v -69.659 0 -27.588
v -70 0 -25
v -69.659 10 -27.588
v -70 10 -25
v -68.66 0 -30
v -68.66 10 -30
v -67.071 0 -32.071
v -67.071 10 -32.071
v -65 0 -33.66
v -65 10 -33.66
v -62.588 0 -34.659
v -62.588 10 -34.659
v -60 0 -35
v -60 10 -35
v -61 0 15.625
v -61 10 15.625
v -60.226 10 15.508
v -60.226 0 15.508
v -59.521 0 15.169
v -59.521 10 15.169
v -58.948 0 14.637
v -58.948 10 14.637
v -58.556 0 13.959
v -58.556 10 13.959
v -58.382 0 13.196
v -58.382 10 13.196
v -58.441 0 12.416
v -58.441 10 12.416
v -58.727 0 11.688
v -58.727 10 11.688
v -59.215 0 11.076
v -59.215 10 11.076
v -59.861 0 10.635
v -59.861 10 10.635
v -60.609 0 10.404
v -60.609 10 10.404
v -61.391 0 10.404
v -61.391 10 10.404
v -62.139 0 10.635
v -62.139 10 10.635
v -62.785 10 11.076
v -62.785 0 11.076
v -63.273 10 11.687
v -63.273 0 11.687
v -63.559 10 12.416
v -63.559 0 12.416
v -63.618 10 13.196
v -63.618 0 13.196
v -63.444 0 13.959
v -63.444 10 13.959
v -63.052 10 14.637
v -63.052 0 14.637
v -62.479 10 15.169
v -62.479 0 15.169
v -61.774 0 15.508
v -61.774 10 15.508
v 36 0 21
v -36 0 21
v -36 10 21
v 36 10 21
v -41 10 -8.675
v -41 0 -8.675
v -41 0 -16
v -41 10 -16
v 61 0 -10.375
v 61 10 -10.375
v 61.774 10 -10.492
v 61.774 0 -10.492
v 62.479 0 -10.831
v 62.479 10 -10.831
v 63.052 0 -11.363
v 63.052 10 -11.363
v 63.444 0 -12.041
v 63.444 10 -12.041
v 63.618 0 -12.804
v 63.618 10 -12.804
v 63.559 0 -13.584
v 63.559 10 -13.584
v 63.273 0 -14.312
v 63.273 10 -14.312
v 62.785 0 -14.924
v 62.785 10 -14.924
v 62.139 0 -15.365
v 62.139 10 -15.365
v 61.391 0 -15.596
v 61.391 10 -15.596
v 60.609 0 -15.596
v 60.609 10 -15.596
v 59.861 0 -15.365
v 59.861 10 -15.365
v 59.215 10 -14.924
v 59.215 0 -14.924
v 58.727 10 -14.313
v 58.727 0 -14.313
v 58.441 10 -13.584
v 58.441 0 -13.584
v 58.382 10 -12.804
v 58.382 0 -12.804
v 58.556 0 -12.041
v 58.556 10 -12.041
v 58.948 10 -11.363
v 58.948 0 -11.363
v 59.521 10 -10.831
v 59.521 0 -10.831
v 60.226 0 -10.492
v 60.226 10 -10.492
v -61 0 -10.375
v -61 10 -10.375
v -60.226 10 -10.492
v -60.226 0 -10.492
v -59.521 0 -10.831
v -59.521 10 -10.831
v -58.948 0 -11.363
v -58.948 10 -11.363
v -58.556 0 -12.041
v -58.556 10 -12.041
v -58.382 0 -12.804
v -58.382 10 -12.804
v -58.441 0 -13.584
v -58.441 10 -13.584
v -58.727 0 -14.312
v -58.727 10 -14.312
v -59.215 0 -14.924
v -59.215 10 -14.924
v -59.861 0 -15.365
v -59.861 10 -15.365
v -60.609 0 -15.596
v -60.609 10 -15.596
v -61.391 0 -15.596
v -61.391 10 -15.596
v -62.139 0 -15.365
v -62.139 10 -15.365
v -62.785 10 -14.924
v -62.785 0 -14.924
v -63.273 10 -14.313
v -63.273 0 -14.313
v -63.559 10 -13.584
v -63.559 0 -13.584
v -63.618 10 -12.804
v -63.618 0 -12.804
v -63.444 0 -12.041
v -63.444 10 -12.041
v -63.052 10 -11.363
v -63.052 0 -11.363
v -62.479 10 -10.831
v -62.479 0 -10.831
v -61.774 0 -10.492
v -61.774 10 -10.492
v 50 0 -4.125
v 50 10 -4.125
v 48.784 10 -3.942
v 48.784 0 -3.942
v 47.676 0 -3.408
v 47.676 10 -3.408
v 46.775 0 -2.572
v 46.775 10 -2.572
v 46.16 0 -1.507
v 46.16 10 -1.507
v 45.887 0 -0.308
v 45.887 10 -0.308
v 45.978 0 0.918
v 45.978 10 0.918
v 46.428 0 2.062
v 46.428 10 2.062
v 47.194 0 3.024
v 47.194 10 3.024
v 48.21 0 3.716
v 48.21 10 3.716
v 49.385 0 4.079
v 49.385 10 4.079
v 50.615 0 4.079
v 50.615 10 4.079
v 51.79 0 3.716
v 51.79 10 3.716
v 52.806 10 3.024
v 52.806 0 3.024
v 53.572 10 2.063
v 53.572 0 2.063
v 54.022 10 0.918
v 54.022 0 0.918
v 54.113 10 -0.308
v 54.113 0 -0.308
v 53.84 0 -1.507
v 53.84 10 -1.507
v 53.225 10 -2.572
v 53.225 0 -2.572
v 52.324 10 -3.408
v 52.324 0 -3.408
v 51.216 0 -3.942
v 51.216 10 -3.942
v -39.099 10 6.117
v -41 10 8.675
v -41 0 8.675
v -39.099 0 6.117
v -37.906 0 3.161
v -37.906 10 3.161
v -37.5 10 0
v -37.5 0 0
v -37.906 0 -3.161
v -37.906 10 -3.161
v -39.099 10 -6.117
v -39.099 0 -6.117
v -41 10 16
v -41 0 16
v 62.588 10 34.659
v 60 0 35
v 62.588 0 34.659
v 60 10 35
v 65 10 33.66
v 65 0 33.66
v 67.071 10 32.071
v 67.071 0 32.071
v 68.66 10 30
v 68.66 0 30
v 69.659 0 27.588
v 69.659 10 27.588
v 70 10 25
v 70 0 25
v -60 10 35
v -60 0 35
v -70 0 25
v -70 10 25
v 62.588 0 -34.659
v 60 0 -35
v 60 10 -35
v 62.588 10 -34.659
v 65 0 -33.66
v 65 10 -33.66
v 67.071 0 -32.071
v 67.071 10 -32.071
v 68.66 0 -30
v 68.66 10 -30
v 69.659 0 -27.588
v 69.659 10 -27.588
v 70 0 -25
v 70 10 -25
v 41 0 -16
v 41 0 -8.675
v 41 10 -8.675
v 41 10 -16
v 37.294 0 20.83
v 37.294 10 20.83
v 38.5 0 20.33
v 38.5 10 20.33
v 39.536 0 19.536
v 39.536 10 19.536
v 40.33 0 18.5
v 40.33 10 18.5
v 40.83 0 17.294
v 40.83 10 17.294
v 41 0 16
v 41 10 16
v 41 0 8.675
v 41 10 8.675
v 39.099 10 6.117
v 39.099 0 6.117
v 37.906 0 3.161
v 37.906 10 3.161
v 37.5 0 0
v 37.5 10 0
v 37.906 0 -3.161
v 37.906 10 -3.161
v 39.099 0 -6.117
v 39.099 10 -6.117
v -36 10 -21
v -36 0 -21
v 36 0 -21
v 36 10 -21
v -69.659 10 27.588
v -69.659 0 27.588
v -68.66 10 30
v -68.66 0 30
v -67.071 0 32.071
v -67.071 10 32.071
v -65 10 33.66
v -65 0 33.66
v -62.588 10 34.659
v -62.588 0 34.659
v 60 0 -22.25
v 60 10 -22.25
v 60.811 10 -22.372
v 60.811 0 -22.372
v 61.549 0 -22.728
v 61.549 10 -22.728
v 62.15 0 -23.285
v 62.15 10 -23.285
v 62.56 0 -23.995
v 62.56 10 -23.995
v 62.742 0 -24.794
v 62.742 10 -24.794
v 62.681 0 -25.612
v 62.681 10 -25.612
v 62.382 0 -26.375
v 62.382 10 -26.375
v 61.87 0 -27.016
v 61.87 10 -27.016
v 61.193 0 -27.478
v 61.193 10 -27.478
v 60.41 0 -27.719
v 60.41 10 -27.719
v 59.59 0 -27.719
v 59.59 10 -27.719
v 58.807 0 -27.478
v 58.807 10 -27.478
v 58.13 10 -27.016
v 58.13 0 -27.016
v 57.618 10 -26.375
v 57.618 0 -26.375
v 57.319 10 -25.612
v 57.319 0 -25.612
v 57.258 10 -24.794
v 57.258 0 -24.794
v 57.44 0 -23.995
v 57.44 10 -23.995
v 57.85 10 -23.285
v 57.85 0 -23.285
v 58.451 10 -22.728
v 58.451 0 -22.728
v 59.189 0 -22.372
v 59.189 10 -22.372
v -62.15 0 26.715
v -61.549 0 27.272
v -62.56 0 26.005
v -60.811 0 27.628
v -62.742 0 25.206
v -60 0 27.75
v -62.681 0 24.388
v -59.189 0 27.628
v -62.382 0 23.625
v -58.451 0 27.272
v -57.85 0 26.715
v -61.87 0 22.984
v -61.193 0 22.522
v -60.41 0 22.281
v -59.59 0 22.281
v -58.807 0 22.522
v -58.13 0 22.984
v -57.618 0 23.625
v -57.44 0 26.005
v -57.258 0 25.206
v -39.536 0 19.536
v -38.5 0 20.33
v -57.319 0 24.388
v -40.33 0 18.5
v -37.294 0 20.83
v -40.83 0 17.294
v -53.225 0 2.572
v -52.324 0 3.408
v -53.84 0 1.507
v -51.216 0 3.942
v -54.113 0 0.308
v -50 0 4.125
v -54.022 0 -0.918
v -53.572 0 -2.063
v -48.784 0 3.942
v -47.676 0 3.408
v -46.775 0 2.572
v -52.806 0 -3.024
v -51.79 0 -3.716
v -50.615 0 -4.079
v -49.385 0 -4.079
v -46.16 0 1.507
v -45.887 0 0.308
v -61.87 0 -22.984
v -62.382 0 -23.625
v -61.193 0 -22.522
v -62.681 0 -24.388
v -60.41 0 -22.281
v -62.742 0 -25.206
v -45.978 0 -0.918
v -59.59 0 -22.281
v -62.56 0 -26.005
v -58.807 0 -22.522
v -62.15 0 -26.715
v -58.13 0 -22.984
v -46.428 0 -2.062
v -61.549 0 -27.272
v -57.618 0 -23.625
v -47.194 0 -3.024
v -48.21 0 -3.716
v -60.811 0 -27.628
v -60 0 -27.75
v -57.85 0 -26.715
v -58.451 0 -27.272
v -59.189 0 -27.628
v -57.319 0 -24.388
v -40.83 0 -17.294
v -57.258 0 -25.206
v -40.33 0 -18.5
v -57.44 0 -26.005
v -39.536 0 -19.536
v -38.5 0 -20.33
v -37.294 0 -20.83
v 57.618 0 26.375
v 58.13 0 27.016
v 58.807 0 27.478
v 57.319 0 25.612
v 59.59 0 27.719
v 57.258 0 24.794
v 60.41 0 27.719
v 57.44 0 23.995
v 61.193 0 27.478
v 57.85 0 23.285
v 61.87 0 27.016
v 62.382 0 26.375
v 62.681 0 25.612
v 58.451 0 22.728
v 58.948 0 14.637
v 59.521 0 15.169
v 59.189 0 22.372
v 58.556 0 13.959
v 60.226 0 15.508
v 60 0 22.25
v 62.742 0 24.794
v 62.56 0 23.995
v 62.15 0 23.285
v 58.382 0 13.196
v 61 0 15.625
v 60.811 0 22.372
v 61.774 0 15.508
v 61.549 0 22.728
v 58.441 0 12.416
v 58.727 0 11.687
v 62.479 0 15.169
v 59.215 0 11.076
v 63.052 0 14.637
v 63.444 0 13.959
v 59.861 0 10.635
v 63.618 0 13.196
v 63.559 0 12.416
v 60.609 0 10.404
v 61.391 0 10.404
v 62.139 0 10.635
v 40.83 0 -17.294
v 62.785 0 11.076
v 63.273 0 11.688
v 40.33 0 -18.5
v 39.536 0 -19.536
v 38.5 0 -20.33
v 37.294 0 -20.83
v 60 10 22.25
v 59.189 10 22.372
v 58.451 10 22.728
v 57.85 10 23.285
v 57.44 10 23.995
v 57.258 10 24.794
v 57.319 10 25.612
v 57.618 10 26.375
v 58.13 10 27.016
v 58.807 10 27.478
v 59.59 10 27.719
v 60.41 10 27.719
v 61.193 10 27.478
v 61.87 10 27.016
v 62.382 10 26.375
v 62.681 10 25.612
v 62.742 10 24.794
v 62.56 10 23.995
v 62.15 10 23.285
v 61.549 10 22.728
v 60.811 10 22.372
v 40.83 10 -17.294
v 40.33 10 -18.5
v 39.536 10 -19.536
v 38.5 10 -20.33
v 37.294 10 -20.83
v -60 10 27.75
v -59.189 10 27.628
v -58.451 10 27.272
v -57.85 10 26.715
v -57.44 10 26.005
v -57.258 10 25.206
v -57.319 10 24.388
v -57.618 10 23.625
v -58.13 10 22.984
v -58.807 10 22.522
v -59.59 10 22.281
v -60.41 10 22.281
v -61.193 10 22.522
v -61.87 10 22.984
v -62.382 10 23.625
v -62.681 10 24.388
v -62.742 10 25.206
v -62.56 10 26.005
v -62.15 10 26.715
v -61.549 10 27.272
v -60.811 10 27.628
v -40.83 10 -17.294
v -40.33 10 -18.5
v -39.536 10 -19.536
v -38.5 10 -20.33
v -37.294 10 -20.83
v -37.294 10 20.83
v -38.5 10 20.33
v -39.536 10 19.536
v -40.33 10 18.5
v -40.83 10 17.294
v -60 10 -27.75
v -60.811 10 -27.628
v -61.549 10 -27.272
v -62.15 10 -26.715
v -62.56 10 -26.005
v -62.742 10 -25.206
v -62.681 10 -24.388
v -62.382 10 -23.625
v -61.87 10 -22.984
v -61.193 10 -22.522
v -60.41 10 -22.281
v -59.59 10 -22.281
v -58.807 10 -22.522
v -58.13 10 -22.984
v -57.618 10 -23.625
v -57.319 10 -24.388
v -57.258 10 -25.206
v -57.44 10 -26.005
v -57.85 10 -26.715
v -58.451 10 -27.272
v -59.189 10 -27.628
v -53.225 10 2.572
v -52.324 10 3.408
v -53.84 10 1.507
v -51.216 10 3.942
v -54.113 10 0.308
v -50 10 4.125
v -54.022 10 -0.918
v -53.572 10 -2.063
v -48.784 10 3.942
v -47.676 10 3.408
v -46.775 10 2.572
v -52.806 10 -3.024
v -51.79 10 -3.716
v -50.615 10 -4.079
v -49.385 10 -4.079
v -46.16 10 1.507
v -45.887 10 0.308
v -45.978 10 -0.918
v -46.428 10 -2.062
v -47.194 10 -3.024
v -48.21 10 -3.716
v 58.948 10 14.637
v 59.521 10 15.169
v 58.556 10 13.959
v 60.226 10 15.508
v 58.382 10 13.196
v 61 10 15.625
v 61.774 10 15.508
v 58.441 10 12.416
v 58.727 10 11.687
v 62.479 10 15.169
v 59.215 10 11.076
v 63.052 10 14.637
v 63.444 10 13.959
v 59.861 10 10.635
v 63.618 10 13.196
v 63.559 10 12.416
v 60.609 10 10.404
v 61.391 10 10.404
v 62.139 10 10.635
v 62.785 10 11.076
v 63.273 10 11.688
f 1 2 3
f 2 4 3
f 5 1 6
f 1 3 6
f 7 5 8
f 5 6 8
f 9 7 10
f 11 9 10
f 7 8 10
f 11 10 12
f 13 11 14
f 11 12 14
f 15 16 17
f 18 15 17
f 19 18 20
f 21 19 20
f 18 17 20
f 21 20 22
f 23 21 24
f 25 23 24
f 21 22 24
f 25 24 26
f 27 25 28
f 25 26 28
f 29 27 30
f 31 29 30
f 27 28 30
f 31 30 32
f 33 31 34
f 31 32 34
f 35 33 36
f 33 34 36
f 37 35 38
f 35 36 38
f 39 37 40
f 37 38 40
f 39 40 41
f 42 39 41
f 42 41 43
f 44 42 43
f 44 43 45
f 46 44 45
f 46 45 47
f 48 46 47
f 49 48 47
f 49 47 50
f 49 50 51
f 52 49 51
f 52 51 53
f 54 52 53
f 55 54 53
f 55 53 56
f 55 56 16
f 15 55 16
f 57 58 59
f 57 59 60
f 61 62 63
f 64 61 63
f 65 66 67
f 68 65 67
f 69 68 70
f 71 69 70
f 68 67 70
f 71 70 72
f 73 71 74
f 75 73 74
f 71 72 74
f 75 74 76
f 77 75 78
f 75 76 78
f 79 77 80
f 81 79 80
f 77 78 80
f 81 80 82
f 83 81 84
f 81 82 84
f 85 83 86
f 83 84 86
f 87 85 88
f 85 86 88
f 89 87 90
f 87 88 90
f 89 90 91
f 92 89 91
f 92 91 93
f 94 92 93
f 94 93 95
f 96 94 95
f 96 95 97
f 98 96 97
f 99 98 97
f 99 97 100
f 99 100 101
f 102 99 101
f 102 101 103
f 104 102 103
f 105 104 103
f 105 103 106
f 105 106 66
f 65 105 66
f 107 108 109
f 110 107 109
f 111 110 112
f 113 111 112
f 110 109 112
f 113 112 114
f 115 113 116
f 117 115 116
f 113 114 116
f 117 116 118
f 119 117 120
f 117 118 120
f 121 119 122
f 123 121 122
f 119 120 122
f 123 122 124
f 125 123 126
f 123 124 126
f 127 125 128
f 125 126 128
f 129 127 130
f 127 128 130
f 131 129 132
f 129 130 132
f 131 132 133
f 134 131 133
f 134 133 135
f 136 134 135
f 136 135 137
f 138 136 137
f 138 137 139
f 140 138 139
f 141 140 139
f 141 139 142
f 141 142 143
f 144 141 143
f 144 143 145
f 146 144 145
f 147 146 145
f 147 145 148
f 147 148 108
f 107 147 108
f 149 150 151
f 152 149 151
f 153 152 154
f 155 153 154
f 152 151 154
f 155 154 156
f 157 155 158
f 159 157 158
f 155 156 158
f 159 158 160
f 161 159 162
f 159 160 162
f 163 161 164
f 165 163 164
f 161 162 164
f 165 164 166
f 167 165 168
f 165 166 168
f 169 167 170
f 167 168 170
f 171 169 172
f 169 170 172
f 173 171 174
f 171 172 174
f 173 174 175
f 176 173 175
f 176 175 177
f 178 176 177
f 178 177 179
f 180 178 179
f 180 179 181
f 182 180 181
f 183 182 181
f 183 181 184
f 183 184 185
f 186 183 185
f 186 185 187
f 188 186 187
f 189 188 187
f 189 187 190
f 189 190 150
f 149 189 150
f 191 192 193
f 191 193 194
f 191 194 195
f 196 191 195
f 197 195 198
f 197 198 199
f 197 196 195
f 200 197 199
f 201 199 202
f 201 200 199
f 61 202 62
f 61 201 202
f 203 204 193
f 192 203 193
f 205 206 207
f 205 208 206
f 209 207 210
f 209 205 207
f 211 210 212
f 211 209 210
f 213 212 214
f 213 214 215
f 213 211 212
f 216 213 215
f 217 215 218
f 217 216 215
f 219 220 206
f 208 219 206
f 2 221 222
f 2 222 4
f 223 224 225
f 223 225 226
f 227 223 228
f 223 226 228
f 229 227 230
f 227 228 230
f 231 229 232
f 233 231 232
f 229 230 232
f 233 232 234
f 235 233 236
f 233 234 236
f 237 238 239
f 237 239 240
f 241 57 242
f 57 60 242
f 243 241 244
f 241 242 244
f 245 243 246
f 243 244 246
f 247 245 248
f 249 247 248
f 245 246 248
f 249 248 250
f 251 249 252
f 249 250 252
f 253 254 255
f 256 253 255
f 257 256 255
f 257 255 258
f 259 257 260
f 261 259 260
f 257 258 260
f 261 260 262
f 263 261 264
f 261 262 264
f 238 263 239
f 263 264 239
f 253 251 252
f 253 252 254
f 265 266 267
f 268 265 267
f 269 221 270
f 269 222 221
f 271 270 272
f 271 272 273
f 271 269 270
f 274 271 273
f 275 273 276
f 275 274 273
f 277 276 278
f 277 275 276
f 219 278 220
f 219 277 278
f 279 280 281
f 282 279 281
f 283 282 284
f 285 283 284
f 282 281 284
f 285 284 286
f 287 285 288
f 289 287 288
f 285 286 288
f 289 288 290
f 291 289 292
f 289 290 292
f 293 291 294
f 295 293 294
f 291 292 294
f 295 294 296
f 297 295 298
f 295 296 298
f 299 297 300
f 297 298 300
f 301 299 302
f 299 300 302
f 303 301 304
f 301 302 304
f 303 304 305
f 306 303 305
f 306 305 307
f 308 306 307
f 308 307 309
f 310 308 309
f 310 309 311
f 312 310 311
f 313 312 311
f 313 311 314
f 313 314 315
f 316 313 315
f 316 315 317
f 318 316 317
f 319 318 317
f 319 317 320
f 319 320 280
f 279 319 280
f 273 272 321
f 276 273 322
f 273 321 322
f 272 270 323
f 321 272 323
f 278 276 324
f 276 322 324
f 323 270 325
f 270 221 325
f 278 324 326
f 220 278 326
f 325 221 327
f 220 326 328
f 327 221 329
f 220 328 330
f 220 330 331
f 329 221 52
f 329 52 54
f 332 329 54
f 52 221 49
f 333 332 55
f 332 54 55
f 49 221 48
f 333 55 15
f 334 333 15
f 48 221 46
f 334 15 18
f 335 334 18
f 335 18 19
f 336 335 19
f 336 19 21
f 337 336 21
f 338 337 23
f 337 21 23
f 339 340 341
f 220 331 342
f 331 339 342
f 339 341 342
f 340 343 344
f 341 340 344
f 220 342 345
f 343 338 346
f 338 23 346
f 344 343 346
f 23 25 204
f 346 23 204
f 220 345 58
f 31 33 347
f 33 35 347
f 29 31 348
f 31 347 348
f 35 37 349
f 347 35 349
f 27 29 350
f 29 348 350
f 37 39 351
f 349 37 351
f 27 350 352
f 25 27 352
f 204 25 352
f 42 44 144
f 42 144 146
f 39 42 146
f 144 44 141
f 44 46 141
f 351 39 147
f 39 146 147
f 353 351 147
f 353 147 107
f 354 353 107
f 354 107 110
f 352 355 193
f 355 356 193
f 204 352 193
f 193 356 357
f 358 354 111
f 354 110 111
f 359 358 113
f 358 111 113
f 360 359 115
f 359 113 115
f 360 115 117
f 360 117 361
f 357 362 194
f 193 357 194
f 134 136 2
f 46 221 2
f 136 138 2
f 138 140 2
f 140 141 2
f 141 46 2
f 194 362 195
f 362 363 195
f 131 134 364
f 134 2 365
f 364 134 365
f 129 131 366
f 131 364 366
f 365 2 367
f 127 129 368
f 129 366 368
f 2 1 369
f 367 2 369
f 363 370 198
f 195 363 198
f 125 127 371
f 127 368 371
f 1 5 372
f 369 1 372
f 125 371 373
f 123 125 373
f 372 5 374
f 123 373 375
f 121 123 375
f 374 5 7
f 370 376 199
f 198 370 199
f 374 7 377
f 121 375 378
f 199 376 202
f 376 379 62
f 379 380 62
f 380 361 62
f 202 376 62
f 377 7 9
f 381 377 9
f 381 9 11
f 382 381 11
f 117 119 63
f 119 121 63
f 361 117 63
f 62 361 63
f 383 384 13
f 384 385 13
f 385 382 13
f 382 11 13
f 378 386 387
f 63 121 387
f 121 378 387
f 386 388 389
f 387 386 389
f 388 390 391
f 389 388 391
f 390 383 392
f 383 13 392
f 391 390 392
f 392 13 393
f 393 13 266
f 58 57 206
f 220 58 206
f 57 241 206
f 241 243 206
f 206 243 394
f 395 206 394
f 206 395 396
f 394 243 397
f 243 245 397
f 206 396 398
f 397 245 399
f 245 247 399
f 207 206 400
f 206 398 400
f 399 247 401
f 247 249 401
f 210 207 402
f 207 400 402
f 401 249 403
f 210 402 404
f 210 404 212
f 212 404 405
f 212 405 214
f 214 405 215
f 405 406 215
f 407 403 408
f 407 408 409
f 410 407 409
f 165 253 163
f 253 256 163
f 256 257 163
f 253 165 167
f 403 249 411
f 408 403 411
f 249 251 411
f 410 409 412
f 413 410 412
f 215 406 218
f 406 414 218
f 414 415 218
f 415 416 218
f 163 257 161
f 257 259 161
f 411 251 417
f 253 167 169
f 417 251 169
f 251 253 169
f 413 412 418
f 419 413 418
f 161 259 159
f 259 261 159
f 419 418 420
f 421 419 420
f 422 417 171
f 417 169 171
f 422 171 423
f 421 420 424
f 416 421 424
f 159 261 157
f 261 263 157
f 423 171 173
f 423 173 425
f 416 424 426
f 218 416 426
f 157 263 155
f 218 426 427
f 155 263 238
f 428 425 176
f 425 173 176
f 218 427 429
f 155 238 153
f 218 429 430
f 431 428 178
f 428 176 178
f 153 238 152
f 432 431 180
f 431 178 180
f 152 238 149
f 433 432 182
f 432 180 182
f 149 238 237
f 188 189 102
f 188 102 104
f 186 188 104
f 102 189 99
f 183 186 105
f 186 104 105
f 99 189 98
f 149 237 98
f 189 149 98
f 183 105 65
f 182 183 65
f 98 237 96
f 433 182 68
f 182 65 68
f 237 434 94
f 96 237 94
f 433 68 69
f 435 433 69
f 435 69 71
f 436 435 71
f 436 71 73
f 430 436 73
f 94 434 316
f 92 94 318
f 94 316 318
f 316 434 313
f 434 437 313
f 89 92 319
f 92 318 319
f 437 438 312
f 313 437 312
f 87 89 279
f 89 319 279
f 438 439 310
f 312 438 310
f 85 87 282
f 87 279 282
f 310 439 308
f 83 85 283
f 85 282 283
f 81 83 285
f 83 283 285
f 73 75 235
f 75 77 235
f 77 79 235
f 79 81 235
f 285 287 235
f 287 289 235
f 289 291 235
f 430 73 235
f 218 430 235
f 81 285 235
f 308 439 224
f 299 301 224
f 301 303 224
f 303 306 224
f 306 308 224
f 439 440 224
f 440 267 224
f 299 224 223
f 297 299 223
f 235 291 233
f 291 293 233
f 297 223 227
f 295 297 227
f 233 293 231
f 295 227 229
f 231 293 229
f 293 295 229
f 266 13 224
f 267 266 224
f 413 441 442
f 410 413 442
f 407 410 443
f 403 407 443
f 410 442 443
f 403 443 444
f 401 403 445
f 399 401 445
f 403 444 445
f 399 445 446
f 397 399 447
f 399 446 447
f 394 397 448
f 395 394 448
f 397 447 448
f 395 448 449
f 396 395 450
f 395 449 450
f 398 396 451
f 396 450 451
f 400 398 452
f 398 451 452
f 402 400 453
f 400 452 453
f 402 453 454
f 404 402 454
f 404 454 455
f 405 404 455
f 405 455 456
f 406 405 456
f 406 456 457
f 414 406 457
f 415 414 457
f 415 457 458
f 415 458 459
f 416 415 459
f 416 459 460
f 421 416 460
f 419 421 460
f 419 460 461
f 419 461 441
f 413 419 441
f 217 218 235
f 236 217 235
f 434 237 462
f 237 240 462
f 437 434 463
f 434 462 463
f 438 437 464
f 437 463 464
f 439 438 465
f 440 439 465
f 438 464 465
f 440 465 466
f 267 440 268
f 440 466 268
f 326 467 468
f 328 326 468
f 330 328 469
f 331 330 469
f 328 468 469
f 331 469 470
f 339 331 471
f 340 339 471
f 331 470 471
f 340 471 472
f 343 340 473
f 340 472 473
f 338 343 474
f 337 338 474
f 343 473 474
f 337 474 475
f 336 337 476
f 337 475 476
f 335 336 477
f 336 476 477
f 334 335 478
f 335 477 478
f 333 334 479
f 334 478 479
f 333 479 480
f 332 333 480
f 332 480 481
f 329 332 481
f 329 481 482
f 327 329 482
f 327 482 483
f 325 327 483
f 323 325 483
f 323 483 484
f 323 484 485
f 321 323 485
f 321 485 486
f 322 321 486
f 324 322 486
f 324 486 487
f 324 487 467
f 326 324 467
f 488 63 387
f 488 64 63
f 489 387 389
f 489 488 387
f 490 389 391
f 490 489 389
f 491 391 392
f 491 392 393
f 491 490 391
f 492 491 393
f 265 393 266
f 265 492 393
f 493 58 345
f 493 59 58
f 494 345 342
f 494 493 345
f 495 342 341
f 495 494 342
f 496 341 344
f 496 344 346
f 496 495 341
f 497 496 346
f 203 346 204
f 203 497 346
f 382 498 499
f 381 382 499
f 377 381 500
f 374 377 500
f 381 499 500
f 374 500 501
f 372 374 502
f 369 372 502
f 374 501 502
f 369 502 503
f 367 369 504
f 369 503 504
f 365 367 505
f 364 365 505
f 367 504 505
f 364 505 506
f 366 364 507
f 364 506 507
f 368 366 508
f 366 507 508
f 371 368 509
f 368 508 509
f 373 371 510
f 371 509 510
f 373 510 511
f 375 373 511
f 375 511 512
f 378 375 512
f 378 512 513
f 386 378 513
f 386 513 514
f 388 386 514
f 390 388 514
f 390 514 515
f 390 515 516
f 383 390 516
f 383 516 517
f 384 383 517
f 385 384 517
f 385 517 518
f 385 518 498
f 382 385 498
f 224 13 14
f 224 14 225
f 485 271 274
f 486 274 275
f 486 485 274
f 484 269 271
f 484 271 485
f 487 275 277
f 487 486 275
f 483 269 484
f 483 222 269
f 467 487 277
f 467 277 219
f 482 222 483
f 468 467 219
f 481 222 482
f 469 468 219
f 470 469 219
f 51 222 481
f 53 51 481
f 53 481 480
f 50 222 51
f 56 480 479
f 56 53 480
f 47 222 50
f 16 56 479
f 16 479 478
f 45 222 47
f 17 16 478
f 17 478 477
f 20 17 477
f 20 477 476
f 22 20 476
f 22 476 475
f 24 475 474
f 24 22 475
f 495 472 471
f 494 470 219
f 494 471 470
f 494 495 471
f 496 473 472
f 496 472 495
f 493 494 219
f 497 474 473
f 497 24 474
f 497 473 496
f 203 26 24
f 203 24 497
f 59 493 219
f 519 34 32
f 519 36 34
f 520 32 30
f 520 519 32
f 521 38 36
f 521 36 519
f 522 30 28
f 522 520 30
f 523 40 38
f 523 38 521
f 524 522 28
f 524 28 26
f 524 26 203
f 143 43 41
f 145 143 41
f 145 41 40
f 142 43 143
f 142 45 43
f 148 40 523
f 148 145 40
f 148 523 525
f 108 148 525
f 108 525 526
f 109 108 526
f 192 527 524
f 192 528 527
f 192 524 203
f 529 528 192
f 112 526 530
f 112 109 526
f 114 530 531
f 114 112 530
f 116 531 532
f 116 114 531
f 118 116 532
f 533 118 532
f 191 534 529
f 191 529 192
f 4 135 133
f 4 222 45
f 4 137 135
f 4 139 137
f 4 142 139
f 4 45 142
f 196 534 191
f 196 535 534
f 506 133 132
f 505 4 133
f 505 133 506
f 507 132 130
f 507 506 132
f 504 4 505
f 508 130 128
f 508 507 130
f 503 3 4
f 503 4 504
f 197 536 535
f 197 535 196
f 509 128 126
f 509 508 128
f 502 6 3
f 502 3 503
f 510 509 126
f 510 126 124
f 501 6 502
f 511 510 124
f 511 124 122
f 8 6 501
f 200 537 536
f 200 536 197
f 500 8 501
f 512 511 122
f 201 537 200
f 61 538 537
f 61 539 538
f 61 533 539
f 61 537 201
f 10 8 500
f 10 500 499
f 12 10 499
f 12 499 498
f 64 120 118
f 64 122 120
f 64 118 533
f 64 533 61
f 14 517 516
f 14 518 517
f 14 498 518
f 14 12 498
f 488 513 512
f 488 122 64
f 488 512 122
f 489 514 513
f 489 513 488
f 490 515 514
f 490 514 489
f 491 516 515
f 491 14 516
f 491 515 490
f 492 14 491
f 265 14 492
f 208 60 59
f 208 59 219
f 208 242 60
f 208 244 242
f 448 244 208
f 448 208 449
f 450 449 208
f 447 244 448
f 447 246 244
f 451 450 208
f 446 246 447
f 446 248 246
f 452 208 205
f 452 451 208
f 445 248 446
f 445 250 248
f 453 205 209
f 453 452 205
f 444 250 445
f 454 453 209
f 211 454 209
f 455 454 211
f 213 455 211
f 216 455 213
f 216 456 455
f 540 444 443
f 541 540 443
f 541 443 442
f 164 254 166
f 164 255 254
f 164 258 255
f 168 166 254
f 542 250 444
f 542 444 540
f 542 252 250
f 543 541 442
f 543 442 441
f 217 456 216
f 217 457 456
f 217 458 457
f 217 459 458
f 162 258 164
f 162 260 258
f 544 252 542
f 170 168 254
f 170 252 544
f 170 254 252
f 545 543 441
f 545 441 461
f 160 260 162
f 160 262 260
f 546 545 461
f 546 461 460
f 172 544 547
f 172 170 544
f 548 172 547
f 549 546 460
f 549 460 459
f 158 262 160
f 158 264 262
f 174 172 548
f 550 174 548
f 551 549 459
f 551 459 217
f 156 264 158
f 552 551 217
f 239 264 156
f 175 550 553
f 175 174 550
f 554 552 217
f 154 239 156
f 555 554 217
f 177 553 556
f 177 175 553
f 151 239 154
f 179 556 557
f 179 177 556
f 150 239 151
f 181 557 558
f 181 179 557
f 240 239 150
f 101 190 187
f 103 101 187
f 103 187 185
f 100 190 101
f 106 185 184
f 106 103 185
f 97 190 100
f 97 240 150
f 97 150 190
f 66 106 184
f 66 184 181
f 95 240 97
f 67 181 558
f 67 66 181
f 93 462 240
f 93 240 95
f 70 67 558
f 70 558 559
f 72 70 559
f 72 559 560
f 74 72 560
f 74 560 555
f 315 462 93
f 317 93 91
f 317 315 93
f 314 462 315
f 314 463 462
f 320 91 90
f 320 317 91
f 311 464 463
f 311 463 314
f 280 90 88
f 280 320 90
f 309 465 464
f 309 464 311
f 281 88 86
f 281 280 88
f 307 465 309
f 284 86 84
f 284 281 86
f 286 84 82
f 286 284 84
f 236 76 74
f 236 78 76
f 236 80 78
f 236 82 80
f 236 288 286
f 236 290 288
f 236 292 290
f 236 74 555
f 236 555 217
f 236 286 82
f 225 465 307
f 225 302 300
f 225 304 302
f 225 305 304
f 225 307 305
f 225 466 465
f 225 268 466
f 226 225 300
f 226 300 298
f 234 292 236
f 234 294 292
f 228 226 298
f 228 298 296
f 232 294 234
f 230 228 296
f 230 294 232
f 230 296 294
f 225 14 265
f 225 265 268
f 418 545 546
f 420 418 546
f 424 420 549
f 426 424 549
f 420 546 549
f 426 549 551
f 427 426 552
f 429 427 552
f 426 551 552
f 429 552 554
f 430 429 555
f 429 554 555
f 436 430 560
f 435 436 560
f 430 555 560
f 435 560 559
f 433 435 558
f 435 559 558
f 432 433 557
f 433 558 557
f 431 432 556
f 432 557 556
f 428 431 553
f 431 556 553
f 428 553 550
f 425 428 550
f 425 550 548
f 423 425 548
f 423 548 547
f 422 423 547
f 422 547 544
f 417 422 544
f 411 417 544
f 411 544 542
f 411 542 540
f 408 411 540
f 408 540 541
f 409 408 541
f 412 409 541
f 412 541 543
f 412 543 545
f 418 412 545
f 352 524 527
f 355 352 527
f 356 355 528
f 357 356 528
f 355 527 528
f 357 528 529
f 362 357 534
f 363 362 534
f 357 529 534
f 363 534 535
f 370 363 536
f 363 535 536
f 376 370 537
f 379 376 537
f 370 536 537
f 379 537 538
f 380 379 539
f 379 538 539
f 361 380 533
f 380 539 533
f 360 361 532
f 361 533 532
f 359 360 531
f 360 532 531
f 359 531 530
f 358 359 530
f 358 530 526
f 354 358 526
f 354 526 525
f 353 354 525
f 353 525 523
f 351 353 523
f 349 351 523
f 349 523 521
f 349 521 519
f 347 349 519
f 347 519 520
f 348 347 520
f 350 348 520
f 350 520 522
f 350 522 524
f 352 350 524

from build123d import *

# Parameters (mm, degrees)
SKETCH1_W           = 140
SKETCH1_H           = 70
SKETCH1_W_2         = 82
SKETCH1_H_2         = 42
BOSS_EXTRUDE1_DEPTH = 10
FILLET1_R           = 10
SKETCH2_R           = 2.75
CUT_EXTRUDE1_DEPTH  = 79.89866919
SKETCH3_R           = 4.125
CUT_EXTRUDE2_DEPTH  = 79.89866919
BOSS_EXTRUDE2_DEPTH = 10
FILLET2_R           = 5
SKETCH5_R           = 2.625
CUT_EXTRUDE3_DEPTH  = 79.89866919


with BuildPart() as part:
    # Sketch1 → Boss-Extrude1 (new body)
    with BuildSketch(Plane(origin=(0, 0, 0), x_dir=(1, 0, 0), z_dir=(0, 1, 0))):
        Rectangle(SKETCH1_W, SKETCH1_H)
        Rectangle(SKETCH1_W_2, SKETCH1_H_2, mode=Mode.SUBTRACT)
    extrude(amount=BOSS_EXTRUDE1_DEPTH)

    # Fillet1
    fillet1_edges = [part.edges().sort_by_distance(p)[0] for p in [
        (70, 5, 35),
        (-70, 5, 35),
        (-70, 5, -35),
        (70, 5, -35),
    ]]
    fillet(fillet1_edges, radius=FILLET1_R)

    # Sketch2 → Cut-Extrude1 (cut, through all)
    with BuildSketch(Plane(origin=(0, 10, 0), x_dir=(1, 0, 0), z_dir=(0, 1, 0))):
        with Locations(Location((-60, -25, 0), (0, 0, 270))):
            Circle(SKETCH2_R)
        with Locations(Location((-60, 25, 0), (0, 0, 90))):
            Circle(SKETCH2_R)
        with Locations(Location((60, -25, 0), (0, 0, 90))):
            Circle(SKETCH2_R)
        with Locations(Location((60, 25, 0), (0, 0, 270))):
            Circle(SKETCH2_R)
    extrude(amount=-CUT_EXTRUDE1_DEPTH, mode=Mode.SUBTRACT)

    # Sketch3 → Cut-Extrude2 (cut, through all)
    with BuildSketch(Plane(origin=(0, 10, 0), x_dir=(1, 0, 0), z_dir=(0, 1, 0))):
        with Locations(Location((-50, 0, 0), (0, 0, 270))):
            Circle(SKETCH3_R)
        with Locations(Location((50, 0, 0), (0, 0, 90))):
            Circle(SKETCH3_R)
    extrude(amount=-CUT_EXTRUDE2_DEPTH, mode=Mode.SUBTRACT)

    # Sketch4 → Boss-Extrude2 (add)
    with BuildSketch(Plane(origin=(0, 10, 0), x_dir=(1, 0, 0), z_dir=(0, 1, 0))):
        with BuildLine():
            Line((-41, 8.674675786), (-41, -8.674675786))
            ThreePointArc((-41, -8.674675786), (-37.5, 0), (-41, 8.674675786))
        make_face()
        with BuildLine():
            Line((41, 8.674675786), (41, -8.674675786))
            ThreePointArc((41, -8.674675786), (37.5, 0), (41, 8.674675786))
        make_face()
    extrude(amount=-BOSS_EXTRUDE2_DEPTH)

    # Fillet2
    fillet2_edges = [part.edges().sort_by_distance(p)[0] for p in [
        (41, 5, 21),
        (41, 5, -21),
        (-41, 5, -21),
        (-41, 5, 21),
    ]]
    fillet(fillet2_edges, radius=FILLET2_R)

    # Sketch5 → Cut-Extrude3 (cut, through all)
    with BuildSketch(Plane(origin=(0, 10, 0), x_dir=(1, 0, 0), z_dir=(0, 1, 0))):
        with Locations(Location((-61, 13, 0), (0, 0, 270))):
            Circle(SKETCH5_R)
        with Locations(Location((-61, -13, 0), (0, 0, 270))):
            Circle(SKETCH5_R)
        with Locations(Location((61, 13, 0), (0, 0, 270))):
            Circle(SKETCH5_R)
        with Locations(Location((61, -13, 0), (0, 0, 270))):
            Circle(SKETCH5_R)
    extrude(amount=-CUT_EXTRUDE3_DEPTH, mode=Mode.SUBTRACT)


solid = part.part
